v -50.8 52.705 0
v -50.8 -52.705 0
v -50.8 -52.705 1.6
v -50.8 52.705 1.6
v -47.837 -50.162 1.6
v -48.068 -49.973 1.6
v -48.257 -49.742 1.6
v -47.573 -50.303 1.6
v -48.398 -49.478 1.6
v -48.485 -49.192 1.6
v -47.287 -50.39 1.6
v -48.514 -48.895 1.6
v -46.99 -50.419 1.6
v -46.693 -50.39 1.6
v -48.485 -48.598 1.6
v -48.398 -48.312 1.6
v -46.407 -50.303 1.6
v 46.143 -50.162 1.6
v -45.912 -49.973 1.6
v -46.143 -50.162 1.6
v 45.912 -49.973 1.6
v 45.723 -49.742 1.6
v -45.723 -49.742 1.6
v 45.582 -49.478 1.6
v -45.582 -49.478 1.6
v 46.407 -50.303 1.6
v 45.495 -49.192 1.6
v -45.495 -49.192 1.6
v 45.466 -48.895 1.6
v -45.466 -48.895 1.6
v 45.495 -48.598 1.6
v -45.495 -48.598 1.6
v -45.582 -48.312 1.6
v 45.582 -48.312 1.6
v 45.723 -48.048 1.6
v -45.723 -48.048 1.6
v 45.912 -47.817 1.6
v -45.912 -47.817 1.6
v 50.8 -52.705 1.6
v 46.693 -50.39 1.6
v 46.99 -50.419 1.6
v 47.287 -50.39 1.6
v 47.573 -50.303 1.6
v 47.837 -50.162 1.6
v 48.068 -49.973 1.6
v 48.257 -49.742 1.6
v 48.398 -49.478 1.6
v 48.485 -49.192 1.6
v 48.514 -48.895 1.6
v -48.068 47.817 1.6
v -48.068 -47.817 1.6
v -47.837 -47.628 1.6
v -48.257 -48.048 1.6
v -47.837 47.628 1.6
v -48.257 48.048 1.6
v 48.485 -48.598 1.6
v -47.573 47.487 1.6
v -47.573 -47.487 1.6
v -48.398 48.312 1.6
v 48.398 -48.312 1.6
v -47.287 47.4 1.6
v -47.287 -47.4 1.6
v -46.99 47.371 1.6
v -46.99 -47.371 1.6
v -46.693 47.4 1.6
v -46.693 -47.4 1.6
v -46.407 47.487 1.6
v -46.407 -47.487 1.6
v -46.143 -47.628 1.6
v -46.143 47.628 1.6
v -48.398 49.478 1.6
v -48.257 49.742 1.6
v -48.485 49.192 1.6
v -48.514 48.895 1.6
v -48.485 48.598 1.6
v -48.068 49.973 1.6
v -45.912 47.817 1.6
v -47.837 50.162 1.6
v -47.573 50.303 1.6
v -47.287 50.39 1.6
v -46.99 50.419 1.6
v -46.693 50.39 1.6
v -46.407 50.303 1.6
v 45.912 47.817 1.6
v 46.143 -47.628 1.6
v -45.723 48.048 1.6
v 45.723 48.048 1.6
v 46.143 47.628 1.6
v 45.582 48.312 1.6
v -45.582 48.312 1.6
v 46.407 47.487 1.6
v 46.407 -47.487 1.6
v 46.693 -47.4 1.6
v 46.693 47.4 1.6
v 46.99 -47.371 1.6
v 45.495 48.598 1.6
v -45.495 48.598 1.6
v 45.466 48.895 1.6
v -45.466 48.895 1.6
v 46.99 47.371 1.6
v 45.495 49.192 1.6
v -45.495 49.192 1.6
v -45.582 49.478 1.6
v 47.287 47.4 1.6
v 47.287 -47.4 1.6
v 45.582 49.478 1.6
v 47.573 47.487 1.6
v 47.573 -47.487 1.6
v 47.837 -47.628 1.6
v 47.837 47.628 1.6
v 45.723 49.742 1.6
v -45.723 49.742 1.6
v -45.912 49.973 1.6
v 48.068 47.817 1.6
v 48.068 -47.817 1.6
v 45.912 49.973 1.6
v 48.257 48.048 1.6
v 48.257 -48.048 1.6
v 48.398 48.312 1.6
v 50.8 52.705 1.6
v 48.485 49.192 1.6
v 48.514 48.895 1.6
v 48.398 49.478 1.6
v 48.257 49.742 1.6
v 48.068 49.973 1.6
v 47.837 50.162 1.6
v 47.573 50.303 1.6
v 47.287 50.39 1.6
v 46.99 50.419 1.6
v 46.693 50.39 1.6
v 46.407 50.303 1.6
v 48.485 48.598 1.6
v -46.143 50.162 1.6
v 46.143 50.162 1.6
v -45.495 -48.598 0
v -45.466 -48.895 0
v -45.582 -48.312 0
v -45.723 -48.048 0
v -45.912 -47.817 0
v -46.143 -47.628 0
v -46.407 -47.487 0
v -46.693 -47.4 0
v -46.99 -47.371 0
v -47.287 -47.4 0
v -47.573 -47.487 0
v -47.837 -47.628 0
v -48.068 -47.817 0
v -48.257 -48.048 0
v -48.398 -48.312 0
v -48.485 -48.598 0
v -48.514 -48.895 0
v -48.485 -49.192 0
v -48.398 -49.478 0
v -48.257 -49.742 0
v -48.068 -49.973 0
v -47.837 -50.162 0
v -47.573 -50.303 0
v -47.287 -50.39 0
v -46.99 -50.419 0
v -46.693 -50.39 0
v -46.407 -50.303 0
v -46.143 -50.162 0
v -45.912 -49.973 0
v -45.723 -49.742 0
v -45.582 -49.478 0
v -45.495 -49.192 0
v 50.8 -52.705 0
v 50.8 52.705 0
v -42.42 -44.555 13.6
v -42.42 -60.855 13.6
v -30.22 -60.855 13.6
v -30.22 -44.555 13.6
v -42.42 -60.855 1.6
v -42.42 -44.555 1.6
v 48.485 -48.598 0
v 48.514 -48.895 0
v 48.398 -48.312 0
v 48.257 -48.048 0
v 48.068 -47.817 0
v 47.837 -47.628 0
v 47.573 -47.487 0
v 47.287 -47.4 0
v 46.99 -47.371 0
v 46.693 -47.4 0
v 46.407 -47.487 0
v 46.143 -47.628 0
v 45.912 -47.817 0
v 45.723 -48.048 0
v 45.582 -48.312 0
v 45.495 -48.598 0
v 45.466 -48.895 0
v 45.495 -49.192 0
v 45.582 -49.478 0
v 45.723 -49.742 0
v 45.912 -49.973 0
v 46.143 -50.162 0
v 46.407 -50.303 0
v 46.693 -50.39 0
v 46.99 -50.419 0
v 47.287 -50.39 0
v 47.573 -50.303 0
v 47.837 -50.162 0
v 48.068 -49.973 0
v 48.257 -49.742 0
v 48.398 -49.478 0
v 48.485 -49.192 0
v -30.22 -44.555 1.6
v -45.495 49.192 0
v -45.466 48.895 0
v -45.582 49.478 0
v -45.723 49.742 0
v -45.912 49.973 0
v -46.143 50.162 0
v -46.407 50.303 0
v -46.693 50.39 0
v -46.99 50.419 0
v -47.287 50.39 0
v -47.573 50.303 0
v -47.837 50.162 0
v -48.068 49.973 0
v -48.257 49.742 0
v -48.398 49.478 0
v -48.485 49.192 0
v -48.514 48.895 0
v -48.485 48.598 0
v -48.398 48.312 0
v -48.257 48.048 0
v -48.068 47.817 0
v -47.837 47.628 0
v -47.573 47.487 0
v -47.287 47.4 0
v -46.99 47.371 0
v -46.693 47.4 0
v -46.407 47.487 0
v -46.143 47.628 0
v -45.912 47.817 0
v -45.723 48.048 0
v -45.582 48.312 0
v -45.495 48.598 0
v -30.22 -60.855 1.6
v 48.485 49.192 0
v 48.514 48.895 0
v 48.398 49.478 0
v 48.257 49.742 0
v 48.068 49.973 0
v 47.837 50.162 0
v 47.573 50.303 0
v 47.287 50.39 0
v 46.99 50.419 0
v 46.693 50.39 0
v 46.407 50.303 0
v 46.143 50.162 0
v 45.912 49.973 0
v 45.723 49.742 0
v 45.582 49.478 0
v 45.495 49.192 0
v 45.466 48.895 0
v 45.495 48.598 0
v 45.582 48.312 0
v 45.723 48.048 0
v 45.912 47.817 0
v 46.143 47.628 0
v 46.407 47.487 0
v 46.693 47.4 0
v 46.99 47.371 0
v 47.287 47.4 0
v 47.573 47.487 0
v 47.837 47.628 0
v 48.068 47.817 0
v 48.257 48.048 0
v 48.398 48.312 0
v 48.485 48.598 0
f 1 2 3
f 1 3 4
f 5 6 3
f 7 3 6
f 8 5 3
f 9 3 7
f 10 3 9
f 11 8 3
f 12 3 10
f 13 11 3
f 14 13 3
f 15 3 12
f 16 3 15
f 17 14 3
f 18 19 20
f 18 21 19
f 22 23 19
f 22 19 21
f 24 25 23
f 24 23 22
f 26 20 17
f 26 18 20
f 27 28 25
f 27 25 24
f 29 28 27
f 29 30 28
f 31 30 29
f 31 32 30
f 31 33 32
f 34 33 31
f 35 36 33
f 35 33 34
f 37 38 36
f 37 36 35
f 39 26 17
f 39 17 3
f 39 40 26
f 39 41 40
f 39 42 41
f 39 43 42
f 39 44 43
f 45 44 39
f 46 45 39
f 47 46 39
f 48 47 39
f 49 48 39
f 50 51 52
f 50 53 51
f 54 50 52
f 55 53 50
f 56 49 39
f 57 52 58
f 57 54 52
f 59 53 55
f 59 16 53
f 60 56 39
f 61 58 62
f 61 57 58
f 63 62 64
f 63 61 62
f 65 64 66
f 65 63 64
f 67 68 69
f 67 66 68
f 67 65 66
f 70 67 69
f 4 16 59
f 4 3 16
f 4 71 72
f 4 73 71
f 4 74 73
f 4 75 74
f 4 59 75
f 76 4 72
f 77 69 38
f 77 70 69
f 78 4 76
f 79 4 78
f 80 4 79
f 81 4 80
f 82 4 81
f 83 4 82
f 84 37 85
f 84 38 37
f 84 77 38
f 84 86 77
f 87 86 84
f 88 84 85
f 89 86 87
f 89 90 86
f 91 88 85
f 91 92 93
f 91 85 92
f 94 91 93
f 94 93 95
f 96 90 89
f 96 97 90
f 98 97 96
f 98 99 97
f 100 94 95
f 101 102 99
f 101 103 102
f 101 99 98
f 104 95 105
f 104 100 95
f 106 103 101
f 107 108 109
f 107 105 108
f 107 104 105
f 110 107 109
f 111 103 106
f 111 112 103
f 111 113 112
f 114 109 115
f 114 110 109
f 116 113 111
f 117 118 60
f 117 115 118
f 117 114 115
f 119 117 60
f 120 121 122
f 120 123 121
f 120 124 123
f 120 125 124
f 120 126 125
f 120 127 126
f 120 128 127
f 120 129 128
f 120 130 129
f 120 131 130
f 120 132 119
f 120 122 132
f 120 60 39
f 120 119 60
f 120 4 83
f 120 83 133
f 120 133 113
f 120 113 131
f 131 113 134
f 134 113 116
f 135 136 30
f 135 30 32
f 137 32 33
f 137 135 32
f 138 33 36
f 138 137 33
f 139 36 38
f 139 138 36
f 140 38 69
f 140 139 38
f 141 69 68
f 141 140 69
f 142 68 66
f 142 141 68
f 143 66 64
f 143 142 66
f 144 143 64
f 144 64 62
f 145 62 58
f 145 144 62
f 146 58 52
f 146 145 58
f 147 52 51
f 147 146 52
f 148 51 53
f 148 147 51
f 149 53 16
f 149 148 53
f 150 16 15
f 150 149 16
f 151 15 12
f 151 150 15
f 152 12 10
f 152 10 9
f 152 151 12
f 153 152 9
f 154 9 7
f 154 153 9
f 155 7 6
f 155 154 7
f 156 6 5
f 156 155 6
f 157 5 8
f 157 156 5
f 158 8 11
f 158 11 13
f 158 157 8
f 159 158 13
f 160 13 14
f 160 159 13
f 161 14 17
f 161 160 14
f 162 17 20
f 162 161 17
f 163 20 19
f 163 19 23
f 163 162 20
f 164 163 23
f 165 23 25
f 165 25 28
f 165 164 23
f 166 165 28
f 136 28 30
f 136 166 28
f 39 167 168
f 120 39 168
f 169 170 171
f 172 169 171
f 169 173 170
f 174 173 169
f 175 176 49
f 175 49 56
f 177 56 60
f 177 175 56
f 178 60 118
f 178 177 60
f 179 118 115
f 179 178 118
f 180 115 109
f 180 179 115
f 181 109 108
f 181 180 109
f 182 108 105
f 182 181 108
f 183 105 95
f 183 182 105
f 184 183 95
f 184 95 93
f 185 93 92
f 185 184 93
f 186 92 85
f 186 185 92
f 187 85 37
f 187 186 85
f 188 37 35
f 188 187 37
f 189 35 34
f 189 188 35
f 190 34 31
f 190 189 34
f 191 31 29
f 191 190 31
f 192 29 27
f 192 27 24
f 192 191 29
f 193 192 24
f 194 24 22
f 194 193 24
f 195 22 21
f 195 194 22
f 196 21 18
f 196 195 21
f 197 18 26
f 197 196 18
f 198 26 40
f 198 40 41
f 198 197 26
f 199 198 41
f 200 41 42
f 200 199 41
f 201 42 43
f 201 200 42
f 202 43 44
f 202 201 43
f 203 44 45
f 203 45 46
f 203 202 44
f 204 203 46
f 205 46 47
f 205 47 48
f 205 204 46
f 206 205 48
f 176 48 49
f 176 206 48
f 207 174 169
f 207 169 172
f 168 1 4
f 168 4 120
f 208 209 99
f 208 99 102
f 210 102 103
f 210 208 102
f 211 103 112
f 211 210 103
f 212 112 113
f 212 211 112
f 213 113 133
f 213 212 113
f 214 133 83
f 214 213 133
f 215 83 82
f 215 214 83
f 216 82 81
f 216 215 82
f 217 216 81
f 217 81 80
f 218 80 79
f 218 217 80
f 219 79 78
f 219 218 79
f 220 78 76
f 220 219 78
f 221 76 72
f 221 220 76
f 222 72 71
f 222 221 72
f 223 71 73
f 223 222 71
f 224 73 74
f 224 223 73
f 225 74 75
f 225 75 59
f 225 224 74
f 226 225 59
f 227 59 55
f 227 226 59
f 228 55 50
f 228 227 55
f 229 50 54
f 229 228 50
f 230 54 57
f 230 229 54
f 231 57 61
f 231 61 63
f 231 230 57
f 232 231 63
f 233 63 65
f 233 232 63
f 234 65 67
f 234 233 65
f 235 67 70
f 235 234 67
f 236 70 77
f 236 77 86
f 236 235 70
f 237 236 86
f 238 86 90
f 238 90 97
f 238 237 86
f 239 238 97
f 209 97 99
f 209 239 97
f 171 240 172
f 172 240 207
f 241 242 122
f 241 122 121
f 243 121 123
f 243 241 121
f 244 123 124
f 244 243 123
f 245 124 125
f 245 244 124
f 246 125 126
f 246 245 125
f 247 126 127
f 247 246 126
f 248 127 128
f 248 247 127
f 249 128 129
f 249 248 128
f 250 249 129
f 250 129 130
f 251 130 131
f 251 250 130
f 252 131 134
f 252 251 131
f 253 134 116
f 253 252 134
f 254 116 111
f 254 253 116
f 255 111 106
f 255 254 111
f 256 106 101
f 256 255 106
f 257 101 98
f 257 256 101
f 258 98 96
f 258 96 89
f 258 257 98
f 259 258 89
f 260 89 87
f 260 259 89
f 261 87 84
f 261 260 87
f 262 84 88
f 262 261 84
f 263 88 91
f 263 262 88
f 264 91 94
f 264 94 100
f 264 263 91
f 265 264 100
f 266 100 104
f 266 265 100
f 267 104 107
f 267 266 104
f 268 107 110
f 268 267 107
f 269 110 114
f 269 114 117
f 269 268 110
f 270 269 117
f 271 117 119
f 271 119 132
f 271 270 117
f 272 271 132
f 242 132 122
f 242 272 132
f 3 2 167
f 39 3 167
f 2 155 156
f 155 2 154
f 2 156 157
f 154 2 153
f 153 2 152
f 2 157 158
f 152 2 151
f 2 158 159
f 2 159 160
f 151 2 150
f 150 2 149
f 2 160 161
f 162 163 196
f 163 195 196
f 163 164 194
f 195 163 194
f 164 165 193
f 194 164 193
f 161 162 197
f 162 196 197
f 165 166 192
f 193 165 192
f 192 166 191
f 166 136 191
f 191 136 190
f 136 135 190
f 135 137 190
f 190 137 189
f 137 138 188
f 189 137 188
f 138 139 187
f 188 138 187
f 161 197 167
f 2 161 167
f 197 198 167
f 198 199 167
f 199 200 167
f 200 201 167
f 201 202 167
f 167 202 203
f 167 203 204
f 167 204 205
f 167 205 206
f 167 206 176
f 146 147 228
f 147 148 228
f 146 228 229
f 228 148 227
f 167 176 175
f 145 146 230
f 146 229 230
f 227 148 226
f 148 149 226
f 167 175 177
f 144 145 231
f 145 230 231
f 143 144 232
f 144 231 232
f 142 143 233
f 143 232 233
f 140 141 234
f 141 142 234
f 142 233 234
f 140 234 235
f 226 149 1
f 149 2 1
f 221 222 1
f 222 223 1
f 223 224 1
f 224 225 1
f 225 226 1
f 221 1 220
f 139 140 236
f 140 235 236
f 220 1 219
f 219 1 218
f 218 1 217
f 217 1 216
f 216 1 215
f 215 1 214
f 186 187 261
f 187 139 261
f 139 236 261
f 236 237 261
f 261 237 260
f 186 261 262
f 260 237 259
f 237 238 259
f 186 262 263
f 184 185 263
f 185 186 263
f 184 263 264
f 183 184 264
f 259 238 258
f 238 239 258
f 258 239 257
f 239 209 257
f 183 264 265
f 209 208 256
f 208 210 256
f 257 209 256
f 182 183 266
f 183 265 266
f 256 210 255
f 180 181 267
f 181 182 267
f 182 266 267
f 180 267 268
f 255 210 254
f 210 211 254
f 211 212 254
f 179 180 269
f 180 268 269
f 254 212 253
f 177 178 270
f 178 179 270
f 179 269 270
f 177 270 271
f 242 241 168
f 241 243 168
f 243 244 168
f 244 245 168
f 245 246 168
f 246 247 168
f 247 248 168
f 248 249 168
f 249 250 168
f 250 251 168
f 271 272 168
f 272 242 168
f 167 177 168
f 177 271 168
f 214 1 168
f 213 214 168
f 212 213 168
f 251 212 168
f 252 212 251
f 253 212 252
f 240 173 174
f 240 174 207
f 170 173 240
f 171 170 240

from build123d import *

# Parameters (mm, degrees)
F0_W     = 101.6
F0_H     = 105.41
F0_R     = 1.524
F1_DEPTH = 1.6
F2_W     = 12.2
F2_H     = 16.3
F3_DEPTH = 12


with BuildPart() as f1:
    # F0 (on Top) → F1 (new body)
    with BuildSketch(Plane.XY):
        Rectangle(F0_W, F0_H)
        with Locations((-46.99, -48.895)):
            Circle(F0_R, mode=Mode.SUBTRACT)
        with Locations((46.99, -48.895)):
            Circle(F0_R, mode=Mode.SUBTRACT)
        with Locations((-46.99, 48.895)):
            Circle(F0_R, mode=Mode.SUBTRACT)
        with Locations((46.99, 48.895)):
            Circle(F0_R, mode=Mode.SUBTRACT)
    extrude(amount=F1_DEPTH)


with BuildPart() as f3:
    # F2 (on face) → F3 (new body)
    with BuildSketch(Plane.XY.offset(1.6)):
        with Locations((-36.32, -52.705)):
            Rectangle(F2_W, F2_H)
    extrude(amount=F3_DEPTH)


solid = Compound([f1.part, f3.part])
